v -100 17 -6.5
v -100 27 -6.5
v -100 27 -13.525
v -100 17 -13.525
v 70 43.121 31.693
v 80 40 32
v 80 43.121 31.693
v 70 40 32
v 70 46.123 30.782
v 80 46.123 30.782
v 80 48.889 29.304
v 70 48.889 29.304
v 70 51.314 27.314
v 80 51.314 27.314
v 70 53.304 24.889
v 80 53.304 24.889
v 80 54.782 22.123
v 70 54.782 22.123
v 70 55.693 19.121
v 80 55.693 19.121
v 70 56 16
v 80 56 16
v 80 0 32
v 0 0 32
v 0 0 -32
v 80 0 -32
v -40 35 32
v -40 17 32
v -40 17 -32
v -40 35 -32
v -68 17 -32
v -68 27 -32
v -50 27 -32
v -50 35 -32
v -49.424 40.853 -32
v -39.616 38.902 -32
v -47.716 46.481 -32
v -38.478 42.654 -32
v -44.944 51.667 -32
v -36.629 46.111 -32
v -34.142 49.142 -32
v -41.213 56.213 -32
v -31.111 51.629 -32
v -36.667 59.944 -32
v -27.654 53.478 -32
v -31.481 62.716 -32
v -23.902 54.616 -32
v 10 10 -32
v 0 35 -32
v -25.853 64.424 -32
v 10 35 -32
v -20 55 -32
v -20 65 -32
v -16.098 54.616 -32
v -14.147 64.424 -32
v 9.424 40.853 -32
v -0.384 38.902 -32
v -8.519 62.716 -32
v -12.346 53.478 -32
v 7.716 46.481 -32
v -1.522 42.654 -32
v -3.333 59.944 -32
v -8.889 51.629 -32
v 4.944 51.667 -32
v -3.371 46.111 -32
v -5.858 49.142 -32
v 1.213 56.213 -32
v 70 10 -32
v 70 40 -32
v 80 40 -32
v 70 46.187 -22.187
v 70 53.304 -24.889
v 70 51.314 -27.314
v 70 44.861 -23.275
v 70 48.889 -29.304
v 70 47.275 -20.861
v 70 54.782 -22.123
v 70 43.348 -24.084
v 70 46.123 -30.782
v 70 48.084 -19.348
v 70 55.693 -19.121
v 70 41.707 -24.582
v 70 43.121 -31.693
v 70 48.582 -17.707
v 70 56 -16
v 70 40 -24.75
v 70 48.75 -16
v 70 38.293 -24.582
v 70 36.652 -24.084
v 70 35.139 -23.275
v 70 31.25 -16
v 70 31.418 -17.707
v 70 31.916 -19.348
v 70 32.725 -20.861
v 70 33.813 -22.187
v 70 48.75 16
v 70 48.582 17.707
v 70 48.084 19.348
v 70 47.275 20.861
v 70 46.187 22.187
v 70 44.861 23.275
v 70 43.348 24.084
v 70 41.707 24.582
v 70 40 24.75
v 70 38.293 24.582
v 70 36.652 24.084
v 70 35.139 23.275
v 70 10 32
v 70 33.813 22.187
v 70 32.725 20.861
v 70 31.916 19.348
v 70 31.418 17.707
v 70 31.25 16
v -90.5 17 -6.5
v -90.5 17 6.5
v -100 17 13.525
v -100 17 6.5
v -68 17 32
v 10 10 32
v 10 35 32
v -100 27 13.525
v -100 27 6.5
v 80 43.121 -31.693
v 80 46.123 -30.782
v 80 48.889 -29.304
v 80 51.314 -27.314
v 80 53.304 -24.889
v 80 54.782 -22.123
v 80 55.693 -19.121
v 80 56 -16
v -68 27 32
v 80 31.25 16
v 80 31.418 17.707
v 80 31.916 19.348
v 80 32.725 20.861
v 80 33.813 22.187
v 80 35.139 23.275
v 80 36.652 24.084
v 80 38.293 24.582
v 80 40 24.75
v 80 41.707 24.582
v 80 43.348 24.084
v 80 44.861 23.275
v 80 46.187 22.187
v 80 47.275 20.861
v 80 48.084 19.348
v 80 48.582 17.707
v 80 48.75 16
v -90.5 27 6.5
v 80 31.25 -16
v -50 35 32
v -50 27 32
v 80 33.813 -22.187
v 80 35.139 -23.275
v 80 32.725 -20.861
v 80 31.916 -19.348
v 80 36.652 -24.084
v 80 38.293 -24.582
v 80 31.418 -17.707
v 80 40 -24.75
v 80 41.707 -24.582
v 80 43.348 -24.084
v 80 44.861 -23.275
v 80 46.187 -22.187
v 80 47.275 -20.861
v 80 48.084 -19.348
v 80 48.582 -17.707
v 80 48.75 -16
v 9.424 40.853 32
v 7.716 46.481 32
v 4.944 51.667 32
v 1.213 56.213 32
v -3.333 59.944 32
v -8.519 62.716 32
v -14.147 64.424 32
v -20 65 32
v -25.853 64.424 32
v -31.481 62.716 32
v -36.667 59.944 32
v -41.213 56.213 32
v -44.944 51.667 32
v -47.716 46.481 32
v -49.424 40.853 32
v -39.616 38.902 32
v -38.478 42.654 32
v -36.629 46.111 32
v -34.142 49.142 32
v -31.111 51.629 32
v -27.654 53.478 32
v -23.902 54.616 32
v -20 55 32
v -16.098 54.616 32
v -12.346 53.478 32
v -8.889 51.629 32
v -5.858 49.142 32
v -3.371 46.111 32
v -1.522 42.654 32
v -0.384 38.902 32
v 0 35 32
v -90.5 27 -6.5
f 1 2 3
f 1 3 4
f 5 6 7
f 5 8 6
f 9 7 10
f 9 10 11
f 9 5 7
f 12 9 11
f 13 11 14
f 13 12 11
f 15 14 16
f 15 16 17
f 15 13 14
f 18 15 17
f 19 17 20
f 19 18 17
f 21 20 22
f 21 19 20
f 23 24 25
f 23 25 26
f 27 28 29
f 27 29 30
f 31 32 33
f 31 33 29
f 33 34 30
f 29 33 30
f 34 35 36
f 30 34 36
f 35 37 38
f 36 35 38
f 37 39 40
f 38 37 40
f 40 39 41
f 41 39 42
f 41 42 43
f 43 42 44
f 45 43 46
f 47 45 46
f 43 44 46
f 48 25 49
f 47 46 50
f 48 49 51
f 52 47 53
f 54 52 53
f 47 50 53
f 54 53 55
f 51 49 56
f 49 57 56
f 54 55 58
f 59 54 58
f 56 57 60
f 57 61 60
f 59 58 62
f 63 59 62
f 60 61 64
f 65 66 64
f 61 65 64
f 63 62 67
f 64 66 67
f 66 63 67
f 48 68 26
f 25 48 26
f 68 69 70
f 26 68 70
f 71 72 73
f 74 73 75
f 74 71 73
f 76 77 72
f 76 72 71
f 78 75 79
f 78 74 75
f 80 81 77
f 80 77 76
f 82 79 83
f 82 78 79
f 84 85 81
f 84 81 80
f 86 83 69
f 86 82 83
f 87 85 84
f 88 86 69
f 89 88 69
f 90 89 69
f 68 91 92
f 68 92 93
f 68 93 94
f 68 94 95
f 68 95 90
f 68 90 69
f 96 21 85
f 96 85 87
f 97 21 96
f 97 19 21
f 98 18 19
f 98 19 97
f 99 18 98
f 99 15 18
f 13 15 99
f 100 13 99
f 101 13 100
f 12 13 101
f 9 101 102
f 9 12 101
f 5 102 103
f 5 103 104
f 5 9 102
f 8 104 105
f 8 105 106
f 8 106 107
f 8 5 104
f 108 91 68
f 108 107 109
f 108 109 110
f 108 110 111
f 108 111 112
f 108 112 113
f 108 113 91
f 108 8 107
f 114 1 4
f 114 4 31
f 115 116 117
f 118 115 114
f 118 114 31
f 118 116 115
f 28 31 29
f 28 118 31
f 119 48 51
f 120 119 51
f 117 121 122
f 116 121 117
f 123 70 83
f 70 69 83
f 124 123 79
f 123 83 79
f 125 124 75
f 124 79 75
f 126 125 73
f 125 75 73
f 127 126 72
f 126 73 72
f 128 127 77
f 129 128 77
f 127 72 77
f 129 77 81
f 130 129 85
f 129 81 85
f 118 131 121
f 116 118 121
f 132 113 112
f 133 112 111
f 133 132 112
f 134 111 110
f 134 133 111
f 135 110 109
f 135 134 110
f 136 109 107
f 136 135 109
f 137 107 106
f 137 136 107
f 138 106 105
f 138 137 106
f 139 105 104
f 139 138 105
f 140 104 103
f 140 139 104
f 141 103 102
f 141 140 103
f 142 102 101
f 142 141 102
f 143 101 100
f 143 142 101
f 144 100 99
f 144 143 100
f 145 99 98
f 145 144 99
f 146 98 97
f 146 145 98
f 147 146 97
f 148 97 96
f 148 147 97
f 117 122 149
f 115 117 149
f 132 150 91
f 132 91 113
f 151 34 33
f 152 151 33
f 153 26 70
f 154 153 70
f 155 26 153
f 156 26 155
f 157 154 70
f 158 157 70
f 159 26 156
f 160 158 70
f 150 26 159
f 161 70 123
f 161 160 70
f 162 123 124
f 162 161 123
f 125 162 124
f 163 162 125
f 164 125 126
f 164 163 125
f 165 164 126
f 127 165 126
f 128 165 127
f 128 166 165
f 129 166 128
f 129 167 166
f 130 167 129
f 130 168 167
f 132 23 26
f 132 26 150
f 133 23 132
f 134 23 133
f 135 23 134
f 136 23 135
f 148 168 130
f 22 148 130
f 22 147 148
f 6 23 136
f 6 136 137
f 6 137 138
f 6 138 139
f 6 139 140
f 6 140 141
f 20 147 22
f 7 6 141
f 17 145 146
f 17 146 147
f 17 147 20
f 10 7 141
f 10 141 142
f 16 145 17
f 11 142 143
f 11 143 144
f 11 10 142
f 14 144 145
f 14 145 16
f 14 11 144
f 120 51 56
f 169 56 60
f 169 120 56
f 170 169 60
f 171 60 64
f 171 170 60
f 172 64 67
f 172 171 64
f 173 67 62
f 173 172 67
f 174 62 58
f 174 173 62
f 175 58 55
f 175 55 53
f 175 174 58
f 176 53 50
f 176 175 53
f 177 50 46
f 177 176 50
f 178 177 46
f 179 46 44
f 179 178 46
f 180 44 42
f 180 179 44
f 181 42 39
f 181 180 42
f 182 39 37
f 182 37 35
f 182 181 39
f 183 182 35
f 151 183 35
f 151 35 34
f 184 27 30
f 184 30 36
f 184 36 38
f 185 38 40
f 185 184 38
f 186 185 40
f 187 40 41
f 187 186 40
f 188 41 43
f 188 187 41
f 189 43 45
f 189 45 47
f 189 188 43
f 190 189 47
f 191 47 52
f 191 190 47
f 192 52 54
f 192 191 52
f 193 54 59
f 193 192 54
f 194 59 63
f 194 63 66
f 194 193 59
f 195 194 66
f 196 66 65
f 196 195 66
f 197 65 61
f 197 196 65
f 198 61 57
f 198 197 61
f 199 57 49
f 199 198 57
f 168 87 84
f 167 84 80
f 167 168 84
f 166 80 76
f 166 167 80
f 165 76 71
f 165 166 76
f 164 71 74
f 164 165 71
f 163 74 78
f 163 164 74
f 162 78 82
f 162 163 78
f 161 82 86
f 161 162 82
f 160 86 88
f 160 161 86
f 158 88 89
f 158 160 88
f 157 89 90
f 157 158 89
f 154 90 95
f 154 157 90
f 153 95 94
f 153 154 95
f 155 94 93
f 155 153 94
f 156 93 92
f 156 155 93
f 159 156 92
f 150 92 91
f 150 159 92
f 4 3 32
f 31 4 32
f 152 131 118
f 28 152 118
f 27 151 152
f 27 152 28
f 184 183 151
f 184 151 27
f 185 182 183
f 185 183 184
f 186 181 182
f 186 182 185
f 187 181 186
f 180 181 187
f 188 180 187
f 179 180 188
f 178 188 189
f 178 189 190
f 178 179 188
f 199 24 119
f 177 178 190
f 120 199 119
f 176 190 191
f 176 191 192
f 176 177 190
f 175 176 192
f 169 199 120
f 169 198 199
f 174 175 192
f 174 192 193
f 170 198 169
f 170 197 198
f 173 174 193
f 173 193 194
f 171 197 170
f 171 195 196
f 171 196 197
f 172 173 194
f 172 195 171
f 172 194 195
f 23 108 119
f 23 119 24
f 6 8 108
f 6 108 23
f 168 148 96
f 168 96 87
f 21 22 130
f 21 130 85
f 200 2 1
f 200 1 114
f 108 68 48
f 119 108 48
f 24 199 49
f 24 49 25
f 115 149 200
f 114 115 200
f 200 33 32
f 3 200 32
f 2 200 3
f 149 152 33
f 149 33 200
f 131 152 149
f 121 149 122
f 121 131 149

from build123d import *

# Parameters (mm, degrees)
SALIENTE_EXTRUIR1_DEPTH = 32
CORTAR_EXTRUIR1_REACH   = 113.66
CROQUIS2_W              = 9.5
CROQUIS2_H              = 13
CORTAR_EXTRUIR2_REACH   = 196.034
REDONDEO2_R             = 16


with BuildPart() as part:
    # Croquis1 → Saliente-Extruir1 (new, symmetric)
    with BuildSketch(Plane.XY):
        with BuildLine():
            Line((-100, 27), (-100, 17))
            Line((-100, 17), (-40, 17))
            Line((-40, 17), (-40, 35))
            ThreePointArc((-40, 35), (-20, 55), (0, 35))
            Line((0, 35), (0, 0))
            Line((0, 0), (80, 0))
            Line((80, 0), (80, 56))
            Line((80, 56), (70, 56))
            Line((70, 56), (70, 10))
            Line((70, 10), (10, 10))
            Line((10, 10), (10, 35))
            ThreePointArc((10, 35), (-20, 65), (-50, 35))
            Line((-50, 35), (-50, 27))
            Line((-50, 27), (-100, 27))
        make_face()
    extrude(amount=SALIENTE_EXTRUIR1_DEPTH, both=True)

    # Croquis2 → Cortar-Extruir1 (cut, up to next)
    with BuildSketch(Plane(origin=(0, 27, 0), x_dir=(1, 0, 0), z_dir=(0, 1, 0)), mode=Mode.PRIVATE) as cortar_extruir1_sk1:
        Polygon((-100, 13.524791386), (-68, 32), (-100, 32), align=None)
    cortar_extruir1_tool1 = extrude(cortar_extruir1_sk1.sketch, amount=-CORTAR_EXTRUIR1_REACH, mode=Mode.PRIVATE) & part.part
    # Croquis2 → Cortar-Extruir1 (cut, up to next)
    with BuildSketch(Plane(origin=(0, 27, 0), x_dir=(1, 0, 0), z_dir=(0, 1, 0)), mode=Mode.PRIVATE) as cortar_extruir1_sk2:
        with Locations((-95.25, 0)):
            Rectangle(CROQUIS2_W, CROQUIS2_H)
    cortar_extruir1_tool2 = extrude(cortar_extruir1_sk2.sketch, amount=-CORTAR_EXTRUIR1_REACH, mode=Mode.PRIVATE) & part.part
    # Croquis2 → Cortar-Extruir1 (cut, up to next)
    with BuildSketch(Plane(origin=(0, 27, 0), x_dir=(1, 0, 0), z_dir=(0, 1, 0)), mode=Mode.PRIVATE) as cortar_extruir1_sk3:
        Polygon((-100, -13.524791386), (-100, -32), (-68, -32), align=None)
    cortar_extruir1_tool3 = extrude(cortar_extruir1_sk3.sketch, amount=-CORTAR_EXTRUIR1_REACH, mode=Mode.PRIVATE) & part.part
    add(cortar_extruir1_tool1.solids().sort_by_distance((-89.333333, 27, -25.841597))[0], mode=Mode.SUBTRACT)
    add(cortar_extruir1_tool2.solids().sort_by_distance((-95.25, 27, 0))[0], mode=Mode.SUBTRACT)
    add(cortar_extruir1_tool3.solids().sort_by_distance((-89.333333, 27, 25.841597))[0], mode=Mode.SUBTRACT)

    # Croquis4 → Cortar-Extruir2 (cut, up to next)
    with BuildSketch(Plane(origin=(80, 0, 0), x_dir=(0, 0, -1), z_dir=(1, 0, 0)), mode=Mode.PRIVATE) as cortar_extruir2_sk1:
        with BuildLine():
            Line((-16, 48.75), (16, 48.75))
            ThreePointArc((16, 48.75), (24.75, 40), (16, 31.25))
            Line((16, 31.25), (-16, 31.25))
            ThreePointArc((-16, 31.25), (-24.75, 40), (-16, 48.75))
        make_face()
    cortar_extruir2_tool1 = extrude(cortar_extruir2_sk1.sketch, amount=-CORTAR_EXTRUIR2_REACH, mode=Mode.PRIVATE) & part.part
    add(cortar_extruir2_tool1.solids().sort_by_distance((80, 40, 0))[0], mode=Mode.SUBTRACT)

    # Redondeo2
    redondeo2_edges = [part.edges().sort_by_distance(p)[0] for p in [
        (75, 56, -32),
        (75, 56, 32),
    ]]
    fillet(redondeo2_edges, radius=REDONDEO2_R)


solid = part.part
